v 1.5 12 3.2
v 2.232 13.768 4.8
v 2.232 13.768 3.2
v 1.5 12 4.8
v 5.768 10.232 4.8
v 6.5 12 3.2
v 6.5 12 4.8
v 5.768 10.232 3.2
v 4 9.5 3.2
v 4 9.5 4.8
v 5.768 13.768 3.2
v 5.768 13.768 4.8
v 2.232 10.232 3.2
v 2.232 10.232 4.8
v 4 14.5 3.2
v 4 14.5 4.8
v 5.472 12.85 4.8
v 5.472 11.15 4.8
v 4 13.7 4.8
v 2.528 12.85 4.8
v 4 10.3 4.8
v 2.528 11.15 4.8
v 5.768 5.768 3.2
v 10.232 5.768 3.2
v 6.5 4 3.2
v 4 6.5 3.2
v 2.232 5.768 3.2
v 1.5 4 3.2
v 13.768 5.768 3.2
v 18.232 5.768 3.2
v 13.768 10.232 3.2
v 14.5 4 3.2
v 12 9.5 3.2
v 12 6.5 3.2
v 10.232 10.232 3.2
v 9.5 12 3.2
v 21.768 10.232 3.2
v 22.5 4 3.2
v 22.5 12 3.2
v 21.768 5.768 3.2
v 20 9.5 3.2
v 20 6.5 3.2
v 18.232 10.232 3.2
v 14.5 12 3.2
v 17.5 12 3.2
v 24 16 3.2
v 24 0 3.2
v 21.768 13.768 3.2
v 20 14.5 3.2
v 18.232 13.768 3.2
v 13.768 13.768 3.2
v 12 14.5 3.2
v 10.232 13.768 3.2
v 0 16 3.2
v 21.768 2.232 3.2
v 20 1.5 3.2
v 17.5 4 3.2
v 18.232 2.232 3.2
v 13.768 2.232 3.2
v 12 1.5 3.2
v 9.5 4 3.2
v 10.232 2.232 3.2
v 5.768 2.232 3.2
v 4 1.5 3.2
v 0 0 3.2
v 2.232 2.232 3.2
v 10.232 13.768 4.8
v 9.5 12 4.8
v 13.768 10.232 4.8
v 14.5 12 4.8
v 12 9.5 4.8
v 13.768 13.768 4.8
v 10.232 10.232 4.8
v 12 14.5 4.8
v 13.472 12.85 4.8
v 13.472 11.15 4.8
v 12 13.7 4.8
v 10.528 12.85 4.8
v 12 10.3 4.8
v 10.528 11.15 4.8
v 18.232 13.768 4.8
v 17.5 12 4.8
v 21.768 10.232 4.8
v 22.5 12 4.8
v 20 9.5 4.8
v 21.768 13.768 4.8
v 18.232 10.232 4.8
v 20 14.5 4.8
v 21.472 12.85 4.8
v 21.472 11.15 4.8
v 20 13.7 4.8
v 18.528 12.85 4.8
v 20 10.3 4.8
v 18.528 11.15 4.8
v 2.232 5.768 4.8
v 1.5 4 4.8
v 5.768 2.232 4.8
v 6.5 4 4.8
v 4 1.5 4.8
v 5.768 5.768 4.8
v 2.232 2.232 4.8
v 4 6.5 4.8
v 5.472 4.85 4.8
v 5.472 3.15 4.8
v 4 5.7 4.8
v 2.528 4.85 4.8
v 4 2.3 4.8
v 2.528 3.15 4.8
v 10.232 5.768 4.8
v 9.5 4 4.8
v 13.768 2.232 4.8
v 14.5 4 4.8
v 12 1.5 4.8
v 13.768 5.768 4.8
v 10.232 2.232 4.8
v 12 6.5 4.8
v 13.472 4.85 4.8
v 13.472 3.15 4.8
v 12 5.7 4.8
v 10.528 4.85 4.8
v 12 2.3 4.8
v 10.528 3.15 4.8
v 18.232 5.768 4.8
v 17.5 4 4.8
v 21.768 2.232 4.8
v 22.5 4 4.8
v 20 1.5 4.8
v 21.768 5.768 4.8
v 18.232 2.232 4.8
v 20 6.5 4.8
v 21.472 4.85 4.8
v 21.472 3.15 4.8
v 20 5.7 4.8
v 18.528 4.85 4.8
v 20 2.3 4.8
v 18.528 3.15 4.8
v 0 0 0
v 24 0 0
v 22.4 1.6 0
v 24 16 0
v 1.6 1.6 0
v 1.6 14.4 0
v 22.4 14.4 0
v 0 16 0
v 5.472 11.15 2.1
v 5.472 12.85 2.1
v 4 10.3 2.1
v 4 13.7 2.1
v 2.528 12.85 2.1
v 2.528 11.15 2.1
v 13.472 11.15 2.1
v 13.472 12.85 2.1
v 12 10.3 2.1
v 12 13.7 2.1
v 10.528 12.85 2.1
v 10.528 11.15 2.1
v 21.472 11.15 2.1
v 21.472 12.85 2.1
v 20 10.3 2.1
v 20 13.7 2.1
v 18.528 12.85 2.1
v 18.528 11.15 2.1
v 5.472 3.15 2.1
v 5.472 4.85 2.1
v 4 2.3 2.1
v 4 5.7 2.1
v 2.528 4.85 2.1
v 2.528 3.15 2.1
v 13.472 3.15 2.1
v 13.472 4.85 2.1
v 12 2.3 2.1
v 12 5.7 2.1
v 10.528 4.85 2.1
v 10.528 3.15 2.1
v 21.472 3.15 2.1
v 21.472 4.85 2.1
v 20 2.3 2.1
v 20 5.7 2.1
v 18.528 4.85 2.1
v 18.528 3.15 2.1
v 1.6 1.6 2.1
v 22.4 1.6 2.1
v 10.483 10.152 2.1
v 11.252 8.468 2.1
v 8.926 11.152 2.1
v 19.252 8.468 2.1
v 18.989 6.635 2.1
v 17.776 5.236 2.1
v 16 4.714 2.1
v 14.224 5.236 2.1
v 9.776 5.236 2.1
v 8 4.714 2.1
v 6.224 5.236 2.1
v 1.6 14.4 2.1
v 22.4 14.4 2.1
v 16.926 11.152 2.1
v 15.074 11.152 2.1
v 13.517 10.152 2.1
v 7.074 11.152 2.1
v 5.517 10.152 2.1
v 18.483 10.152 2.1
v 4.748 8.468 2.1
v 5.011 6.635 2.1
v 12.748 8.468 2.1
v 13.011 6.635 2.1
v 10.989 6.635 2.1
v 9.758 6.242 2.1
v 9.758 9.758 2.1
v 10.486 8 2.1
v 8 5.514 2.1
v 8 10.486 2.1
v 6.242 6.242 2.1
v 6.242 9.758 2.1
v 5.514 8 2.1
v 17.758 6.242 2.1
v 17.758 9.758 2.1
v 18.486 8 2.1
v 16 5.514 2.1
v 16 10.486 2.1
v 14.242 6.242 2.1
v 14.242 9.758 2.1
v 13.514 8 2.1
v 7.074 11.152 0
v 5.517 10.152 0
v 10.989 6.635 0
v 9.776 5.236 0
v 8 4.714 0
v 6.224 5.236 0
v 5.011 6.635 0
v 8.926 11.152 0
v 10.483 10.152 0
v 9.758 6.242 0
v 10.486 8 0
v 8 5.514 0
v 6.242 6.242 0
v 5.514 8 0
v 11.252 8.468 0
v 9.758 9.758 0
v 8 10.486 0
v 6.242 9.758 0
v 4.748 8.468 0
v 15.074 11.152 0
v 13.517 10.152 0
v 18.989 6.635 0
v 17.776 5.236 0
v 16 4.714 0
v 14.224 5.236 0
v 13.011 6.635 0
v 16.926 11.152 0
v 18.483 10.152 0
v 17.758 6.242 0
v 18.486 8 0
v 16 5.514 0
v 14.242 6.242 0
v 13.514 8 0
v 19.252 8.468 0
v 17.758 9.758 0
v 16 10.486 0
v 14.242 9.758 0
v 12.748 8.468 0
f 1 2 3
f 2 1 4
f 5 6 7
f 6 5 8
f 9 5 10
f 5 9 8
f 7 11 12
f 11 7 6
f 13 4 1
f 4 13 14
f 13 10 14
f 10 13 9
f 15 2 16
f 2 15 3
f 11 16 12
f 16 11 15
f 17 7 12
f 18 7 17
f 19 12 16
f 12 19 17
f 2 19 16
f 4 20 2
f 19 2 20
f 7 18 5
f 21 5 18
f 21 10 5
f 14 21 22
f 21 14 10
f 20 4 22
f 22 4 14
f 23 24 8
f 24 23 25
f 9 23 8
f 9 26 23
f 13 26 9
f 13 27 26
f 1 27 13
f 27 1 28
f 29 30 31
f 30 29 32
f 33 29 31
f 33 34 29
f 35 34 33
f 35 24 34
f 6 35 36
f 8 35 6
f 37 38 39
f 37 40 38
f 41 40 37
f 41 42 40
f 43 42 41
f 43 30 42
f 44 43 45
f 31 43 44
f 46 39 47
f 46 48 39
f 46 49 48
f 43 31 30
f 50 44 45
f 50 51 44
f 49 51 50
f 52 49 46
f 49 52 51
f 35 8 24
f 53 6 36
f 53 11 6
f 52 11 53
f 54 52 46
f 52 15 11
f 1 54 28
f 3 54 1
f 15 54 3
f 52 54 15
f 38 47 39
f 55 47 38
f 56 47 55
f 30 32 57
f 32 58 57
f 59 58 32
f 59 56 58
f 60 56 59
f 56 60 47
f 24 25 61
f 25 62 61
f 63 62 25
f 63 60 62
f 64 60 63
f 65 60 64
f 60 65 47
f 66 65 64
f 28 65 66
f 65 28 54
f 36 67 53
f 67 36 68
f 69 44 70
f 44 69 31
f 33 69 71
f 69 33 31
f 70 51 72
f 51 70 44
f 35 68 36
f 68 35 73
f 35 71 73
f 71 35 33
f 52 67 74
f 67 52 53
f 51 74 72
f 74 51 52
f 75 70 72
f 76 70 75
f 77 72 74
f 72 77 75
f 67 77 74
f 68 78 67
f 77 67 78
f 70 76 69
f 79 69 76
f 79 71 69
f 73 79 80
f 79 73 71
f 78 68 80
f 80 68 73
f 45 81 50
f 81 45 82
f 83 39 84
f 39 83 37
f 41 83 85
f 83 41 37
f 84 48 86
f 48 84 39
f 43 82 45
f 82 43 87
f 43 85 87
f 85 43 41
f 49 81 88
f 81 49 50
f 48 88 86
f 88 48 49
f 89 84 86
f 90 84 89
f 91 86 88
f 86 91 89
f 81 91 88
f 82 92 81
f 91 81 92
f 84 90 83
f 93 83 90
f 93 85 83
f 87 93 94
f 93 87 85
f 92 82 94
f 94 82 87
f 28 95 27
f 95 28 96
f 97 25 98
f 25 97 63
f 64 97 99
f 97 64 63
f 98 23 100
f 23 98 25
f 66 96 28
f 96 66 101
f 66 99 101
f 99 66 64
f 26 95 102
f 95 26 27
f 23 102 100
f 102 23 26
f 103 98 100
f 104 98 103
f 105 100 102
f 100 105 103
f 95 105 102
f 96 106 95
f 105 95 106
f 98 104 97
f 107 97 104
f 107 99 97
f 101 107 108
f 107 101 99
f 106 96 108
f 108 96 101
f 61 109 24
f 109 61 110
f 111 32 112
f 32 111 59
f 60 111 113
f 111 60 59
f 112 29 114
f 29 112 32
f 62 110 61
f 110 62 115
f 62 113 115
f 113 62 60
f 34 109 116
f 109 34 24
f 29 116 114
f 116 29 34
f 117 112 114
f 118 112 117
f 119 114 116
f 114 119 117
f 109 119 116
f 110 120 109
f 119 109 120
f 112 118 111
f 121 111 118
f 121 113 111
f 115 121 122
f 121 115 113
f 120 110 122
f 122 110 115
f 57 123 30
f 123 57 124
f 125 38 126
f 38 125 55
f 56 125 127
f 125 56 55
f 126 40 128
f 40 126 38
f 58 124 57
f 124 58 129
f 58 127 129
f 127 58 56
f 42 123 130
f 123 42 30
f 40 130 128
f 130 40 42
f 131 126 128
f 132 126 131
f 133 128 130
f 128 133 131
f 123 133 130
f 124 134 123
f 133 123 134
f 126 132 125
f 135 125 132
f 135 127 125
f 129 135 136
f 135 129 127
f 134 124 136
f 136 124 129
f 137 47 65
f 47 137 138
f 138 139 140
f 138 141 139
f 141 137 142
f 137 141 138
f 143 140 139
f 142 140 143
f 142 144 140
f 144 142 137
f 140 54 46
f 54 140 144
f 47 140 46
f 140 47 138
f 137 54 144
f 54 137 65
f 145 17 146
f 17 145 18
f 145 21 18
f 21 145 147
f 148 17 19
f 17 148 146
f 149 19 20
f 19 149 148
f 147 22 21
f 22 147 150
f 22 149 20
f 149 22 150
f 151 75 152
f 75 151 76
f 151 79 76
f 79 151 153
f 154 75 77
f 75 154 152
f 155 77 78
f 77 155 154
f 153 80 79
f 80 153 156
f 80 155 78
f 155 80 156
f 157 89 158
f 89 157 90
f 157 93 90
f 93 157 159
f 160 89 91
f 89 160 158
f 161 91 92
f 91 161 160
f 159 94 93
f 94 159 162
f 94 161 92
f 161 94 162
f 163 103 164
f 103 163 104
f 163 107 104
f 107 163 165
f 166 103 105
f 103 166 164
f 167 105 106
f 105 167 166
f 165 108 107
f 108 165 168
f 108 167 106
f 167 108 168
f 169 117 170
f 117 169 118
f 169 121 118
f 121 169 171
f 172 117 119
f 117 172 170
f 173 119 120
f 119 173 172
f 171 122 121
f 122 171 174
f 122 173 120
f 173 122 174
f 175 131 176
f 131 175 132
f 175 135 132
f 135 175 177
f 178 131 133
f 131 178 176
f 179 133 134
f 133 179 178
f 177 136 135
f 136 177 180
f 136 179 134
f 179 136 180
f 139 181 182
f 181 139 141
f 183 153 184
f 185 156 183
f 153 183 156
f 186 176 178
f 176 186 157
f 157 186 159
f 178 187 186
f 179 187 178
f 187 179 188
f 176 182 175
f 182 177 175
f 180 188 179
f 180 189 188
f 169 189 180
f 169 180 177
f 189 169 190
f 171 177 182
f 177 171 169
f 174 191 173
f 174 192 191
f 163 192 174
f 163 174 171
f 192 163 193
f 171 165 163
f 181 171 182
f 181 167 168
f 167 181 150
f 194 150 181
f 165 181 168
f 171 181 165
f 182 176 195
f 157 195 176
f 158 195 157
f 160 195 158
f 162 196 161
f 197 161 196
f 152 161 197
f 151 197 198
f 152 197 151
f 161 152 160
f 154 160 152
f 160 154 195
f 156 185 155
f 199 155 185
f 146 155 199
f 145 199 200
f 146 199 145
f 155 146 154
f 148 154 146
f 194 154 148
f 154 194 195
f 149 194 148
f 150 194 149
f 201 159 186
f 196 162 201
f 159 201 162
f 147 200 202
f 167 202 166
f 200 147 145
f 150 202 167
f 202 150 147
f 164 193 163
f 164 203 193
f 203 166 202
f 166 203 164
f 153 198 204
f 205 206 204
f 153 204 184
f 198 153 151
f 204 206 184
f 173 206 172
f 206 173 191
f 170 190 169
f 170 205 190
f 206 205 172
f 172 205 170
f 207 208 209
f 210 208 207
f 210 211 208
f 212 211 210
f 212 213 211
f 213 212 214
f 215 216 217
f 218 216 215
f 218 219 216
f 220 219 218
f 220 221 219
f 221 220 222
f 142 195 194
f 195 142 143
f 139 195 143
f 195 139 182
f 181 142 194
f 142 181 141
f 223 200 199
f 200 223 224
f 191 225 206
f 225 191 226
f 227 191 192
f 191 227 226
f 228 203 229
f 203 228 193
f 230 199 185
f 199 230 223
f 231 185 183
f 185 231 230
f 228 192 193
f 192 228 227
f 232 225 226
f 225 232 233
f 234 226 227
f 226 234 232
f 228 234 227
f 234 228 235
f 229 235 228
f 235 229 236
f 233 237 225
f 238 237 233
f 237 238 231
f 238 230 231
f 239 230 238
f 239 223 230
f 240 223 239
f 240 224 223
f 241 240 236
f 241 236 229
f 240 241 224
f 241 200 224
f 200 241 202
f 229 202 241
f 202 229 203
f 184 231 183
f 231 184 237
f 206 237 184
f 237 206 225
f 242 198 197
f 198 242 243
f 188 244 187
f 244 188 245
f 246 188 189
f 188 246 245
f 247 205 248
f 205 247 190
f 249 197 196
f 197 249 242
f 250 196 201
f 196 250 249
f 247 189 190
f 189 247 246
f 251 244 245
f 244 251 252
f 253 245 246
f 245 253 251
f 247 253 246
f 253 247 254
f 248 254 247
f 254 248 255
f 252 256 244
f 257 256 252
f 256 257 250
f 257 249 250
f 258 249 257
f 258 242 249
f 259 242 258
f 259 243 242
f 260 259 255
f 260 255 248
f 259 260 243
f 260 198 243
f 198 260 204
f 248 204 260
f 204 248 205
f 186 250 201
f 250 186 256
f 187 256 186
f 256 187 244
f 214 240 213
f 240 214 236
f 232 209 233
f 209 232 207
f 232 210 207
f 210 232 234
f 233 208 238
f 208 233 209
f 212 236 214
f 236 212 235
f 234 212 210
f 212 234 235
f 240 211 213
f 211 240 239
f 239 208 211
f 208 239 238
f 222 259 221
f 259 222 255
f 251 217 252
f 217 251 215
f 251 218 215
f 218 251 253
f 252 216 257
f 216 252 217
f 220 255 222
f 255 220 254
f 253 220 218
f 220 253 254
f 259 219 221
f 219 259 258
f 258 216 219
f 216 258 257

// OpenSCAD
//narrow_brick(height=3);

brick([2,3],2);

// src: https://bricks.stackexchange.com/questions/288/what-are-the-dimensions-of-a-lego-brick

lego = 1.6;

wall = 1 * lego;
toler = 1;

stud_diam = 3 * lego + .2 * toler;
stud_inner = 2 * lego + .2 * toler;
stud_height = 1 * lego;

duct_diam = 5 * sqrt(2) - 3 + 2.5 * toler;
duct_inner = duct_diam - wall;

brick_one = 5 * lego;
inner_one = brick_one - (wall*2);

//
// API modules
///
function lego_unit() = lego;

function brick_unit() = brick_one;

function brick_height() = 6;

function plate_height() = 2;

module plate(grid=[3,2], pegs=true, hollow=true, posts=true) {
    brick(grid, plate_height(), pegs, hollow, posts);
}

module brick(grid=[2,1], height=brick_height(), pegs=true, hollow=true, posts=true) {
    if (grid[0] < grid[1]) translate([0, grid[0]*brick_one, 0]) rotate([0,0,-90]) brick([grid[1], grid[0]], height, pegs, hollow, posts);
    else {
        if (grid[1] > 1) wide_brick(grid, height, pegs, hollow);
        else narrow_brick(grid[0], height, pegs, hollow, posts);
        }
}

//
// Subroutine modules
//
module wide_brick(grid, height, pegs, hollow) {
    union() {
        brick_sans_posts(grid, height, pegs, hollow);
        difference() {
            for (col = [1 : grid[1]-1]) for(row = [1:grid[0]-1]) color([0,1,1]) translate([brick_one*col,brick_one*row,0]) cylinder(d=duct_diam, lego*height-wall/2);
            for (col = [1 : grid[1]-1]) for(row = [1:grid[0]-1]) color([1,1,1]) translate([brick_one*col,brick_one*row,0]) cylinder(d=duct_inner, lego*height-wall/2);
            }
    }
}

module narrow_brick(length, height, pegs, hollow, posts) {
    union() {
        brick_sans_posts([length, 1], height, pegs, hollow);
        if (posts && length>1) for (spot = [1 : length-1]) color([0,1,0]) translate([brick_one/2,brick_one*spot,0]) cylinder(d=stud_inner, lego*height);
        }
}

module brick_sans_posts(grid, height, pegs, hollow) {
    difference() {
        brick_sans_hollow(grid, height, pegs);
        color([0,0,1]) translate([wall,wall,0]) cube([inner_one+(grid[1]-1)*brick_one, inner_one+(grid[0]-1)*brick_one, lego*height - wall+toler/2]);
        if (pegs && hollow) for (col = [1 : grid[1]]) for(row = [1:grid[0]]) color([1,1,0]) translate([brick_one*(col-.5),brick_one*(row-.5),lego*height-wall*2]) cylinder(d=stud_inner, stud_height+wall*2);
        }
}

module brick_sans_hollow(grid, height, pegs) {
    union() {
        cube([brick_one*grid[1], brick_one*grid[0], lego*height]);
        if (pegs) for (col = [1 : grid[1]]) for(row = [1:grid[0]]) color([1,0,0]) translate([brick_one*(col-.5),brick_one*(row-.5),lego*height]) cylinder(d=stud_diam, stud_height);
        }
}
